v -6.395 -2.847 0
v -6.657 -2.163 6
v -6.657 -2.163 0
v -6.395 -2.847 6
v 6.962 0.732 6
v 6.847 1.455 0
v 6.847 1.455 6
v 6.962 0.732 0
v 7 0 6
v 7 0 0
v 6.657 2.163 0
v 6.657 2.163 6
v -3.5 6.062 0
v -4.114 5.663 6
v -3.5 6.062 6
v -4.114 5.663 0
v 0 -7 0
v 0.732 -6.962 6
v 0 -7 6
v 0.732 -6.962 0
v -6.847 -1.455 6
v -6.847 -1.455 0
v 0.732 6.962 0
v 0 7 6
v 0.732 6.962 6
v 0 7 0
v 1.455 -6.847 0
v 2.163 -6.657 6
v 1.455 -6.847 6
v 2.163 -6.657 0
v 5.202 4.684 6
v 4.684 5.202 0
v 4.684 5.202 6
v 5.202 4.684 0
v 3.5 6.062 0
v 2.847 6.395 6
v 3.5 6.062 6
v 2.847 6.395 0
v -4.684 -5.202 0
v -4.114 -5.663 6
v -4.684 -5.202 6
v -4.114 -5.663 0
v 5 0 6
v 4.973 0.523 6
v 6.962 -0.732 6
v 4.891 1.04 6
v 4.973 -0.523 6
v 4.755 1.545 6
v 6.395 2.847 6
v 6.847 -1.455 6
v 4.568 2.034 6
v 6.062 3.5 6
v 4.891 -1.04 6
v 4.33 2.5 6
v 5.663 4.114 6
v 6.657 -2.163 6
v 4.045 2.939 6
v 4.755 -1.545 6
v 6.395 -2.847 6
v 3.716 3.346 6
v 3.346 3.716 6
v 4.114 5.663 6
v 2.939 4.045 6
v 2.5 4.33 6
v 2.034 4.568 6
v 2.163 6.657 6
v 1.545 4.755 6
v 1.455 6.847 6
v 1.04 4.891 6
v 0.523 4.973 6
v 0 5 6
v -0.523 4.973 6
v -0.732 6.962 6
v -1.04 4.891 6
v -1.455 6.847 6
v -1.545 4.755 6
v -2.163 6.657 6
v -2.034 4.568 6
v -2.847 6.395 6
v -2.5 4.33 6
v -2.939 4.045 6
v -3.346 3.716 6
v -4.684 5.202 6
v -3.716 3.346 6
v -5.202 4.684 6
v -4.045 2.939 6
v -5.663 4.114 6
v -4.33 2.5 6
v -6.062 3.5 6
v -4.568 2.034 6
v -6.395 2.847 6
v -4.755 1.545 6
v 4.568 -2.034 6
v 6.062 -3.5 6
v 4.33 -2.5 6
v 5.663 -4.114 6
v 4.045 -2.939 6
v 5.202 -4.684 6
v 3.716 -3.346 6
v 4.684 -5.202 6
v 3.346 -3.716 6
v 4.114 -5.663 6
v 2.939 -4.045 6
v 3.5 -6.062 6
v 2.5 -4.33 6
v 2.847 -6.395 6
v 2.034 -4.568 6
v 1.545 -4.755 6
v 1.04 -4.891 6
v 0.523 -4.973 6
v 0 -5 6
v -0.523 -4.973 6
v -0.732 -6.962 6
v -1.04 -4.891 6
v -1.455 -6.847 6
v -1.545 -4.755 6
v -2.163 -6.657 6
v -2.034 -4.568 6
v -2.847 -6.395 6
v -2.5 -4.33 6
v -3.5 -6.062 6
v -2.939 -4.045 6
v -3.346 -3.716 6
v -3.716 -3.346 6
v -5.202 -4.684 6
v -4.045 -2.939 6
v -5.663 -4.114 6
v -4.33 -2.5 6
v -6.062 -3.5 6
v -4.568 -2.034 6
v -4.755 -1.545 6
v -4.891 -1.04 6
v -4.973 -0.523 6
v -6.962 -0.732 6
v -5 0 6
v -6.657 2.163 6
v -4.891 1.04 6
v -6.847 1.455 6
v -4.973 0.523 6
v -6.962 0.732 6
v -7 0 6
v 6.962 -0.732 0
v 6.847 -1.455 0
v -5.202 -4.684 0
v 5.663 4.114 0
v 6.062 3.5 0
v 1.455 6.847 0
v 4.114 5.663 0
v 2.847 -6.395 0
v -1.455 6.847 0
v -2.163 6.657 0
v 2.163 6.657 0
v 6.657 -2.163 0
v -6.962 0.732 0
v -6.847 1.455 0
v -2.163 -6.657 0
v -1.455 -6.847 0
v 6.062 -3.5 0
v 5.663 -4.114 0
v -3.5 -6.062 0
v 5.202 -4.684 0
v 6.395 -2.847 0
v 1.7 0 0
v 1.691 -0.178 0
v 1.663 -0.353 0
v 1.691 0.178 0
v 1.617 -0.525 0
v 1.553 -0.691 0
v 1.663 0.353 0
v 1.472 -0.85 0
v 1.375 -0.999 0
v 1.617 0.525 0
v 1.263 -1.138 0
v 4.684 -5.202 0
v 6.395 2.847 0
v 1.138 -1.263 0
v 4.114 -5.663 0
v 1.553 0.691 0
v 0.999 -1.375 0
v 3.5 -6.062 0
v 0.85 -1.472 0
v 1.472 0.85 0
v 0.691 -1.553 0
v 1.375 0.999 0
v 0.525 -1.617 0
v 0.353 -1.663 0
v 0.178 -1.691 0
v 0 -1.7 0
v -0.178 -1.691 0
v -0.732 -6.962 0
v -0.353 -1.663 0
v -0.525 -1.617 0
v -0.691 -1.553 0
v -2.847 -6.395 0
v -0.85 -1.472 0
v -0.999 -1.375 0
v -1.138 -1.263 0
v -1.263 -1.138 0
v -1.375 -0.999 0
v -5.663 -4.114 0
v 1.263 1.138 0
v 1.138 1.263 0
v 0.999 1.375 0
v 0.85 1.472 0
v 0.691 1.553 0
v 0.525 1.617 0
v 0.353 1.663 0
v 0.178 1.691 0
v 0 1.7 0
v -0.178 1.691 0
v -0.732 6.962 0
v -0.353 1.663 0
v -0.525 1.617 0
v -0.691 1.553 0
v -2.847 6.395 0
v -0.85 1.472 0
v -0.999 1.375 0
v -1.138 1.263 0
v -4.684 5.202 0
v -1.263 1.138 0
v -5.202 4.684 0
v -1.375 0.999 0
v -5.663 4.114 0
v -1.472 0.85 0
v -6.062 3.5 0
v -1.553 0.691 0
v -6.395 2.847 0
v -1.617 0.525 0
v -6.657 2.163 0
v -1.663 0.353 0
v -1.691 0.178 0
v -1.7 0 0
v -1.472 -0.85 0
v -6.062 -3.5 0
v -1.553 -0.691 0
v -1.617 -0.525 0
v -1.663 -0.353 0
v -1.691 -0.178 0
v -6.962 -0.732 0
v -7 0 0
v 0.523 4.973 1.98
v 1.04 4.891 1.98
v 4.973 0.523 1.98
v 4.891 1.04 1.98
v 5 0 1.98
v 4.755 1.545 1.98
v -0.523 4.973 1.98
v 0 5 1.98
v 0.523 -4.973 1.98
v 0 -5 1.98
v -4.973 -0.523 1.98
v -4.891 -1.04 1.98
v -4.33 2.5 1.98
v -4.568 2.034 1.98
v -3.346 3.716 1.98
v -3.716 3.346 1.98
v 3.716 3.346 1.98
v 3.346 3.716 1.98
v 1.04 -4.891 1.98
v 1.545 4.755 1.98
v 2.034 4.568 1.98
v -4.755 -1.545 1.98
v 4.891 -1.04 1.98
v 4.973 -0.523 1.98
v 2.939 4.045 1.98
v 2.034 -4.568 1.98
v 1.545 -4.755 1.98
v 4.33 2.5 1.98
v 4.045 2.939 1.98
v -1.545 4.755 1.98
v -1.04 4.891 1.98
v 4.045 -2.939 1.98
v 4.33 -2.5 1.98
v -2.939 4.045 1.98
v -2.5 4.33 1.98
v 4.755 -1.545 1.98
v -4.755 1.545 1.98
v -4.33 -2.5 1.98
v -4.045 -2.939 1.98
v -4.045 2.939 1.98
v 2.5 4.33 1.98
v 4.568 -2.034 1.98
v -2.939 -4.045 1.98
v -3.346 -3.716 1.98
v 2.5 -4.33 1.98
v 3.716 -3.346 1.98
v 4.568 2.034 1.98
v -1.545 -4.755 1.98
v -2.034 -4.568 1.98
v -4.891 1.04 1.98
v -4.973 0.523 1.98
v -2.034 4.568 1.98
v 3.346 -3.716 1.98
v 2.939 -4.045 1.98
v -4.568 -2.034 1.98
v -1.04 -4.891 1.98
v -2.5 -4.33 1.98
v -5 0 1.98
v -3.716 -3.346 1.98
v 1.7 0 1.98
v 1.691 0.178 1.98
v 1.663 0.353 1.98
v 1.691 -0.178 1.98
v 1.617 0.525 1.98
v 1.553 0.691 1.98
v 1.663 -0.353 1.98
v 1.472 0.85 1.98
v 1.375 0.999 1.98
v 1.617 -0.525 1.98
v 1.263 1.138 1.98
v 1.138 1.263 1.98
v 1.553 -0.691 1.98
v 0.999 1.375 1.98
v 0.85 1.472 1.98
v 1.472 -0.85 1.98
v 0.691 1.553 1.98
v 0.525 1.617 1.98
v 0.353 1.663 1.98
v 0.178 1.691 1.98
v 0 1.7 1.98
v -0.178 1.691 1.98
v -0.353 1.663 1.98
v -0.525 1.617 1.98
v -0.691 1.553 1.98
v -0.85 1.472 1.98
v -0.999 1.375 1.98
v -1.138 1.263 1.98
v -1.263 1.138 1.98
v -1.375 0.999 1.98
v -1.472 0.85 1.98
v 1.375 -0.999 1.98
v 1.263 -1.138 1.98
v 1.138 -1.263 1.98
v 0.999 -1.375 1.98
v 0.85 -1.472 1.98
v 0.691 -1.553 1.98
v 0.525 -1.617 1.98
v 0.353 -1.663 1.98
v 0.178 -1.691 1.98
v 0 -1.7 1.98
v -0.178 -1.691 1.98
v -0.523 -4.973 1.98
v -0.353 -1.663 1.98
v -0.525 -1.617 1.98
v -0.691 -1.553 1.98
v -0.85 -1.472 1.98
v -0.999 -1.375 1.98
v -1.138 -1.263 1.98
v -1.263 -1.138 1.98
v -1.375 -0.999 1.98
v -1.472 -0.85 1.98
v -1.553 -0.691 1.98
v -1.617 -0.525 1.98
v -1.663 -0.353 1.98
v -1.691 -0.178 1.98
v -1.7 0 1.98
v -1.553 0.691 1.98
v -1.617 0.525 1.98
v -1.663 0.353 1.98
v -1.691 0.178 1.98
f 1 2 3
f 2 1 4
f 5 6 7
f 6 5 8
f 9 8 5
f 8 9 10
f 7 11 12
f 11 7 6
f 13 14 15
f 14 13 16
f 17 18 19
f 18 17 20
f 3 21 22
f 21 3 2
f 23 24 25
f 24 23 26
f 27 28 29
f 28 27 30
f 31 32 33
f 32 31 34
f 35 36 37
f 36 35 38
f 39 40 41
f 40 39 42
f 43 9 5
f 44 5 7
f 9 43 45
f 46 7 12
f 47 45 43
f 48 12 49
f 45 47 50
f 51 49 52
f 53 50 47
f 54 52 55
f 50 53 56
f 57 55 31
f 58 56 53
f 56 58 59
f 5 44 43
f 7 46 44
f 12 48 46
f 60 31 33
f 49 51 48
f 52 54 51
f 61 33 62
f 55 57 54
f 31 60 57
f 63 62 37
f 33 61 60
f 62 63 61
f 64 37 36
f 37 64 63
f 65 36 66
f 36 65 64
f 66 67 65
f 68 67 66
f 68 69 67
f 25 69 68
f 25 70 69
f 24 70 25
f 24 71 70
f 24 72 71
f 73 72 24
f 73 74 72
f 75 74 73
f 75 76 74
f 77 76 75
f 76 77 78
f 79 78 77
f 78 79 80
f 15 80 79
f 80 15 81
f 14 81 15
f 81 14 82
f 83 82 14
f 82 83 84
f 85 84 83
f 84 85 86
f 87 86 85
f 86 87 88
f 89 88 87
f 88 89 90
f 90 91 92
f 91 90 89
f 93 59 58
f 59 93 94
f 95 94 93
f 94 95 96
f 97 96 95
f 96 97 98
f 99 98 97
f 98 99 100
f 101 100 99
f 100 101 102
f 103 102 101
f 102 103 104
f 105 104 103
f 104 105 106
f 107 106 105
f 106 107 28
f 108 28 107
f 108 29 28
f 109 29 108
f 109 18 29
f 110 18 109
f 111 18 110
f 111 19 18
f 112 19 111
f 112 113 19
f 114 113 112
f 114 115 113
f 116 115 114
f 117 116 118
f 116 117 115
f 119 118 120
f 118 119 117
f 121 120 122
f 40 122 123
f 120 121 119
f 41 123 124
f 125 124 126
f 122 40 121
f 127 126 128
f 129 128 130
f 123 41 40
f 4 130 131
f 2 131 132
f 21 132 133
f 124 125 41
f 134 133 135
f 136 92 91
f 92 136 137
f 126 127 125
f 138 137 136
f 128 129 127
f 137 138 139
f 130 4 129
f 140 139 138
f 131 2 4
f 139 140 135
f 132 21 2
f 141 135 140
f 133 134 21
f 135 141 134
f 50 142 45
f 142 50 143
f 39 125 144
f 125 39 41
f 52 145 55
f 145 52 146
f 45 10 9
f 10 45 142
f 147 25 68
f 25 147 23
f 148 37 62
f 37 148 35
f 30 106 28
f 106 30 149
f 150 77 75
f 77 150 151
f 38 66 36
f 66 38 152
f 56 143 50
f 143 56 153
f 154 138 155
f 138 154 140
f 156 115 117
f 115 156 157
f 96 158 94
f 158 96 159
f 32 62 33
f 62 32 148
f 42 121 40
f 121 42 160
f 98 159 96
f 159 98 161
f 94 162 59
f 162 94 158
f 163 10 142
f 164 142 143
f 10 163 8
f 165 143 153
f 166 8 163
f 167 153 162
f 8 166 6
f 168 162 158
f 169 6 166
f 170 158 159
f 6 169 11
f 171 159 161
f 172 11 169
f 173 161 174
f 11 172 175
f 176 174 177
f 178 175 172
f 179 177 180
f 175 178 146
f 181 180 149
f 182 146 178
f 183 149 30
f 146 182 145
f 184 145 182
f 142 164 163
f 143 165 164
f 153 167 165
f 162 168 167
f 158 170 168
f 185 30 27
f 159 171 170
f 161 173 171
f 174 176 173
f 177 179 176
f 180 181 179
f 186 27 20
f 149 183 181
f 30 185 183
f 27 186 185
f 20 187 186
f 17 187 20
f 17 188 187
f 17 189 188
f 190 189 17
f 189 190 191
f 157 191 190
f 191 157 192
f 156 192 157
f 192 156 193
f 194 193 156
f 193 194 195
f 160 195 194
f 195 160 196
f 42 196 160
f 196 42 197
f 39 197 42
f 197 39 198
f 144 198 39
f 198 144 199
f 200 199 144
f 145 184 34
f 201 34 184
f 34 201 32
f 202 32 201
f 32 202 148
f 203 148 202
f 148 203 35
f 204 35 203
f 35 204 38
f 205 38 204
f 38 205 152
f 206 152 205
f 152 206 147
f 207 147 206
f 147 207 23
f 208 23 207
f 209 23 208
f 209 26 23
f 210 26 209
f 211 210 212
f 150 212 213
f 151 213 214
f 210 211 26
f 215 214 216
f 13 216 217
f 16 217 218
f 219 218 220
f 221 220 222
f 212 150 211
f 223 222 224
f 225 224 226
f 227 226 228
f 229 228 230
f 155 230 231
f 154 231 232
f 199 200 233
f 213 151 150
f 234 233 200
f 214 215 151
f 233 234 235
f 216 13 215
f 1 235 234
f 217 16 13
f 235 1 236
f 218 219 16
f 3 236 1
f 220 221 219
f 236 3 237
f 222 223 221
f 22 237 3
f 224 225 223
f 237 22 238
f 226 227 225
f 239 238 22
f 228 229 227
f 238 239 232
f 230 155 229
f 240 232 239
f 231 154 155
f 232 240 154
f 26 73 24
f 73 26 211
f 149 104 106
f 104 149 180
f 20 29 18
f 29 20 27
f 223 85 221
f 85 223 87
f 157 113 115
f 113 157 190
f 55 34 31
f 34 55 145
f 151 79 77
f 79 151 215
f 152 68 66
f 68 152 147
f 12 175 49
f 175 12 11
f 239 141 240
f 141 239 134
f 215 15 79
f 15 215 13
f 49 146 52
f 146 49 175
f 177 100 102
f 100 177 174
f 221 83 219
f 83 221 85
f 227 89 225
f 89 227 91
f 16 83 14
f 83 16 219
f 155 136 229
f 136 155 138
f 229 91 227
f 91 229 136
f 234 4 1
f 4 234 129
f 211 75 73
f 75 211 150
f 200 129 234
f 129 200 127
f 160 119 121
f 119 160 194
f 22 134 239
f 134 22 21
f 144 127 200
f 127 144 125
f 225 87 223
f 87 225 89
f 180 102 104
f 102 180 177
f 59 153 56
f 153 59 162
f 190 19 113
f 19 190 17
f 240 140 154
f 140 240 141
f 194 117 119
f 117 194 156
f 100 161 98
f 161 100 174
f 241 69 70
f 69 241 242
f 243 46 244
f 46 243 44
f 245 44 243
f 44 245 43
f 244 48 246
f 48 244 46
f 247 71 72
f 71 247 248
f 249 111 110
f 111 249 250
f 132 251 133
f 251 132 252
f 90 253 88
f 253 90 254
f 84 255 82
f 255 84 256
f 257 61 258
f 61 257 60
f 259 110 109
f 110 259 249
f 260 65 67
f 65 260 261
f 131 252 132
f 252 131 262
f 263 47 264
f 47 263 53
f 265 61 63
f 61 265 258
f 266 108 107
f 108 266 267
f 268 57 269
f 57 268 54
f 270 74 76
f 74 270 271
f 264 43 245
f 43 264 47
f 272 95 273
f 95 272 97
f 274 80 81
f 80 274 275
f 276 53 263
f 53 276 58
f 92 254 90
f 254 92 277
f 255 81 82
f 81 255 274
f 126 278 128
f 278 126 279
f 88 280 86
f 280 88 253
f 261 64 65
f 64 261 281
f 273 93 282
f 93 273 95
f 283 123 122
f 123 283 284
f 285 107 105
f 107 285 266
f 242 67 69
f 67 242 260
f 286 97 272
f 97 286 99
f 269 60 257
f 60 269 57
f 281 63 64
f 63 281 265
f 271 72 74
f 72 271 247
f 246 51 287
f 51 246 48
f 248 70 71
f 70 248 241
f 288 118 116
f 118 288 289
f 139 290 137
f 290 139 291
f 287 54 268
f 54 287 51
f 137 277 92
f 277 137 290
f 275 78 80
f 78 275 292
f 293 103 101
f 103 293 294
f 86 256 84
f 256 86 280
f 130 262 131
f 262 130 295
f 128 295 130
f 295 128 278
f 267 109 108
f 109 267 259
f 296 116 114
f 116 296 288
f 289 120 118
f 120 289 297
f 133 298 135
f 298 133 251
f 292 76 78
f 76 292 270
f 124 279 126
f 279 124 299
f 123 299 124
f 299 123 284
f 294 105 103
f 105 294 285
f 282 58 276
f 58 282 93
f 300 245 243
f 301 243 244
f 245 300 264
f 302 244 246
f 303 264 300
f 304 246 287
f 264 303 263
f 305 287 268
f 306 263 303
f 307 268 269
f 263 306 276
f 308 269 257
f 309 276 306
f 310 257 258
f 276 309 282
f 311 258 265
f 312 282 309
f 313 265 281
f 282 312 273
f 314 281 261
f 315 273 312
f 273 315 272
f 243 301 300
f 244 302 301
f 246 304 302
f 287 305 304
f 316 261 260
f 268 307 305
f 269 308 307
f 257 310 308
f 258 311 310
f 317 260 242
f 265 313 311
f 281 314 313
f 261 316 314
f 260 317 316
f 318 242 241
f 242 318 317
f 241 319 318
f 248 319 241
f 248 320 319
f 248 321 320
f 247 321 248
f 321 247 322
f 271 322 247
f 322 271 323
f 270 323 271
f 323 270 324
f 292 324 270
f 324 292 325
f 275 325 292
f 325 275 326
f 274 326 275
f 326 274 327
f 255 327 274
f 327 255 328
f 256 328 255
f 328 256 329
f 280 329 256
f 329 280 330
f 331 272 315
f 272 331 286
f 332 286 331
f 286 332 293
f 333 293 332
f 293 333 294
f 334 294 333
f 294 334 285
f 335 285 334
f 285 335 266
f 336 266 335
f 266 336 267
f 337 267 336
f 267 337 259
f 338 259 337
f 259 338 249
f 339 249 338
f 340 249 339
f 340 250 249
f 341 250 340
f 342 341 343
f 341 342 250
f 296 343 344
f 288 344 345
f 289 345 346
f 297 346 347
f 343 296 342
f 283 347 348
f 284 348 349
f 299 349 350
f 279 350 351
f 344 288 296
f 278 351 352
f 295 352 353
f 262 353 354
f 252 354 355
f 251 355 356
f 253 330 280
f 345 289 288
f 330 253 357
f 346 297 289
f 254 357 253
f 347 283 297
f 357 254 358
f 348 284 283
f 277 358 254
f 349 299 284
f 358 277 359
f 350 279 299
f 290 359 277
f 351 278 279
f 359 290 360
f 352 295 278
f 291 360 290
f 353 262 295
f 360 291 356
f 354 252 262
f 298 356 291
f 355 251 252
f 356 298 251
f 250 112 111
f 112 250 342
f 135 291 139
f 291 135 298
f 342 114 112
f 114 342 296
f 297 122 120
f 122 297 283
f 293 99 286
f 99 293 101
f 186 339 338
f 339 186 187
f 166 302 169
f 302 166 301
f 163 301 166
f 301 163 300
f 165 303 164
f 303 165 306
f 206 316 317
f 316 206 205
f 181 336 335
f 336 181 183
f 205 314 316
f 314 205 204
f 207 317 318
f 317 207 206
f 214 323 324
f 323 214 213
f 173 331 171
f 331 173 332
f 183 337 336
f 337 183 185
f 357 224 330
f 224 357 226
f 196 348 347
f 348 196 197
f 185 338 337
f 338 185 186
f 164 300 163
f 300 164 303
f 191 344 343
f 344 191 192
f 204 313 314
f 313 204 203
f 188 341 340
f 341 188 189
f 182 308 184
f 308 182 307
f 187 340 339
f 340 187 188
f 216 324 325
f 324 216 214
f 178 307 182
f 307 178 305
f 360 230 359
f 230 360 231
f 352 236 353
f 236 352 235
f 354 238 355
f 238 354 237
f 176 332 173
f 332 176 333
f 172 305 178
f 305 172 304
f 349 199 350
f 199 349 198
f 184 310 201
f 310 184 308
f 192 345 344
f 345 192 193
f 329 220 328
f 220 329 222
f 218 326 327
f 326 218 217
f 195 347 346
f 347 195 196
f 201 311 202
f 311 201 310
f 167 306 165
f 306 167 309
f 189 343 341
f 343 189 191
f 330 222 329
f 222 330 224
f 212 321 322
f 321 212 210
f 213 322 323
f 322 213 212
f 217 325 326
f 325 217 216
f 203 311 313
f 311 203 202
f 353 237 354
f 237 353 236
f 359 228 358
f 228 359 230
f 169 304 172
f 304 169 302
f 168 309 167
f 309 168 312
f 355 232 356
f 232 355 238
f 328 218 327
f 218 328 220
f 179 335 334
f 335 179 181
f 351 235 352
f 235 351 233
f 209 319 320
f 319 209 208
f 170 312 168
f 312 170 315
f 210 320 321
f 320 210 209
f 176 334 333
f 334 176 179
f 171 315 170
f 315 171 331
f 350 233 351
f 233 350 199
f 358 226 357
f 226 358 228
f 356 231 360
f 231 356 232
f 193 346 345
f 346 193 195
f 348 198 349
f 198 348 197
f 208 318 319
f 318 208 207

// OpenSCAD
// Recessed magnet cup.
$fn = 60;
eps = 0.02;
magnet_d = 10;
wall = 2;
outer_d = magnet_d+2*wall;
height = wall+4;
difference() {
    cylinder(d=outer_d,h=height);
    translate([0,0,wall-eps]) cylinder(d=magnet_d,h=height-wall+2*eps);
    translate([0,0,-eps]) cylinder(d=3.4,h=wall+2*eps);
}
